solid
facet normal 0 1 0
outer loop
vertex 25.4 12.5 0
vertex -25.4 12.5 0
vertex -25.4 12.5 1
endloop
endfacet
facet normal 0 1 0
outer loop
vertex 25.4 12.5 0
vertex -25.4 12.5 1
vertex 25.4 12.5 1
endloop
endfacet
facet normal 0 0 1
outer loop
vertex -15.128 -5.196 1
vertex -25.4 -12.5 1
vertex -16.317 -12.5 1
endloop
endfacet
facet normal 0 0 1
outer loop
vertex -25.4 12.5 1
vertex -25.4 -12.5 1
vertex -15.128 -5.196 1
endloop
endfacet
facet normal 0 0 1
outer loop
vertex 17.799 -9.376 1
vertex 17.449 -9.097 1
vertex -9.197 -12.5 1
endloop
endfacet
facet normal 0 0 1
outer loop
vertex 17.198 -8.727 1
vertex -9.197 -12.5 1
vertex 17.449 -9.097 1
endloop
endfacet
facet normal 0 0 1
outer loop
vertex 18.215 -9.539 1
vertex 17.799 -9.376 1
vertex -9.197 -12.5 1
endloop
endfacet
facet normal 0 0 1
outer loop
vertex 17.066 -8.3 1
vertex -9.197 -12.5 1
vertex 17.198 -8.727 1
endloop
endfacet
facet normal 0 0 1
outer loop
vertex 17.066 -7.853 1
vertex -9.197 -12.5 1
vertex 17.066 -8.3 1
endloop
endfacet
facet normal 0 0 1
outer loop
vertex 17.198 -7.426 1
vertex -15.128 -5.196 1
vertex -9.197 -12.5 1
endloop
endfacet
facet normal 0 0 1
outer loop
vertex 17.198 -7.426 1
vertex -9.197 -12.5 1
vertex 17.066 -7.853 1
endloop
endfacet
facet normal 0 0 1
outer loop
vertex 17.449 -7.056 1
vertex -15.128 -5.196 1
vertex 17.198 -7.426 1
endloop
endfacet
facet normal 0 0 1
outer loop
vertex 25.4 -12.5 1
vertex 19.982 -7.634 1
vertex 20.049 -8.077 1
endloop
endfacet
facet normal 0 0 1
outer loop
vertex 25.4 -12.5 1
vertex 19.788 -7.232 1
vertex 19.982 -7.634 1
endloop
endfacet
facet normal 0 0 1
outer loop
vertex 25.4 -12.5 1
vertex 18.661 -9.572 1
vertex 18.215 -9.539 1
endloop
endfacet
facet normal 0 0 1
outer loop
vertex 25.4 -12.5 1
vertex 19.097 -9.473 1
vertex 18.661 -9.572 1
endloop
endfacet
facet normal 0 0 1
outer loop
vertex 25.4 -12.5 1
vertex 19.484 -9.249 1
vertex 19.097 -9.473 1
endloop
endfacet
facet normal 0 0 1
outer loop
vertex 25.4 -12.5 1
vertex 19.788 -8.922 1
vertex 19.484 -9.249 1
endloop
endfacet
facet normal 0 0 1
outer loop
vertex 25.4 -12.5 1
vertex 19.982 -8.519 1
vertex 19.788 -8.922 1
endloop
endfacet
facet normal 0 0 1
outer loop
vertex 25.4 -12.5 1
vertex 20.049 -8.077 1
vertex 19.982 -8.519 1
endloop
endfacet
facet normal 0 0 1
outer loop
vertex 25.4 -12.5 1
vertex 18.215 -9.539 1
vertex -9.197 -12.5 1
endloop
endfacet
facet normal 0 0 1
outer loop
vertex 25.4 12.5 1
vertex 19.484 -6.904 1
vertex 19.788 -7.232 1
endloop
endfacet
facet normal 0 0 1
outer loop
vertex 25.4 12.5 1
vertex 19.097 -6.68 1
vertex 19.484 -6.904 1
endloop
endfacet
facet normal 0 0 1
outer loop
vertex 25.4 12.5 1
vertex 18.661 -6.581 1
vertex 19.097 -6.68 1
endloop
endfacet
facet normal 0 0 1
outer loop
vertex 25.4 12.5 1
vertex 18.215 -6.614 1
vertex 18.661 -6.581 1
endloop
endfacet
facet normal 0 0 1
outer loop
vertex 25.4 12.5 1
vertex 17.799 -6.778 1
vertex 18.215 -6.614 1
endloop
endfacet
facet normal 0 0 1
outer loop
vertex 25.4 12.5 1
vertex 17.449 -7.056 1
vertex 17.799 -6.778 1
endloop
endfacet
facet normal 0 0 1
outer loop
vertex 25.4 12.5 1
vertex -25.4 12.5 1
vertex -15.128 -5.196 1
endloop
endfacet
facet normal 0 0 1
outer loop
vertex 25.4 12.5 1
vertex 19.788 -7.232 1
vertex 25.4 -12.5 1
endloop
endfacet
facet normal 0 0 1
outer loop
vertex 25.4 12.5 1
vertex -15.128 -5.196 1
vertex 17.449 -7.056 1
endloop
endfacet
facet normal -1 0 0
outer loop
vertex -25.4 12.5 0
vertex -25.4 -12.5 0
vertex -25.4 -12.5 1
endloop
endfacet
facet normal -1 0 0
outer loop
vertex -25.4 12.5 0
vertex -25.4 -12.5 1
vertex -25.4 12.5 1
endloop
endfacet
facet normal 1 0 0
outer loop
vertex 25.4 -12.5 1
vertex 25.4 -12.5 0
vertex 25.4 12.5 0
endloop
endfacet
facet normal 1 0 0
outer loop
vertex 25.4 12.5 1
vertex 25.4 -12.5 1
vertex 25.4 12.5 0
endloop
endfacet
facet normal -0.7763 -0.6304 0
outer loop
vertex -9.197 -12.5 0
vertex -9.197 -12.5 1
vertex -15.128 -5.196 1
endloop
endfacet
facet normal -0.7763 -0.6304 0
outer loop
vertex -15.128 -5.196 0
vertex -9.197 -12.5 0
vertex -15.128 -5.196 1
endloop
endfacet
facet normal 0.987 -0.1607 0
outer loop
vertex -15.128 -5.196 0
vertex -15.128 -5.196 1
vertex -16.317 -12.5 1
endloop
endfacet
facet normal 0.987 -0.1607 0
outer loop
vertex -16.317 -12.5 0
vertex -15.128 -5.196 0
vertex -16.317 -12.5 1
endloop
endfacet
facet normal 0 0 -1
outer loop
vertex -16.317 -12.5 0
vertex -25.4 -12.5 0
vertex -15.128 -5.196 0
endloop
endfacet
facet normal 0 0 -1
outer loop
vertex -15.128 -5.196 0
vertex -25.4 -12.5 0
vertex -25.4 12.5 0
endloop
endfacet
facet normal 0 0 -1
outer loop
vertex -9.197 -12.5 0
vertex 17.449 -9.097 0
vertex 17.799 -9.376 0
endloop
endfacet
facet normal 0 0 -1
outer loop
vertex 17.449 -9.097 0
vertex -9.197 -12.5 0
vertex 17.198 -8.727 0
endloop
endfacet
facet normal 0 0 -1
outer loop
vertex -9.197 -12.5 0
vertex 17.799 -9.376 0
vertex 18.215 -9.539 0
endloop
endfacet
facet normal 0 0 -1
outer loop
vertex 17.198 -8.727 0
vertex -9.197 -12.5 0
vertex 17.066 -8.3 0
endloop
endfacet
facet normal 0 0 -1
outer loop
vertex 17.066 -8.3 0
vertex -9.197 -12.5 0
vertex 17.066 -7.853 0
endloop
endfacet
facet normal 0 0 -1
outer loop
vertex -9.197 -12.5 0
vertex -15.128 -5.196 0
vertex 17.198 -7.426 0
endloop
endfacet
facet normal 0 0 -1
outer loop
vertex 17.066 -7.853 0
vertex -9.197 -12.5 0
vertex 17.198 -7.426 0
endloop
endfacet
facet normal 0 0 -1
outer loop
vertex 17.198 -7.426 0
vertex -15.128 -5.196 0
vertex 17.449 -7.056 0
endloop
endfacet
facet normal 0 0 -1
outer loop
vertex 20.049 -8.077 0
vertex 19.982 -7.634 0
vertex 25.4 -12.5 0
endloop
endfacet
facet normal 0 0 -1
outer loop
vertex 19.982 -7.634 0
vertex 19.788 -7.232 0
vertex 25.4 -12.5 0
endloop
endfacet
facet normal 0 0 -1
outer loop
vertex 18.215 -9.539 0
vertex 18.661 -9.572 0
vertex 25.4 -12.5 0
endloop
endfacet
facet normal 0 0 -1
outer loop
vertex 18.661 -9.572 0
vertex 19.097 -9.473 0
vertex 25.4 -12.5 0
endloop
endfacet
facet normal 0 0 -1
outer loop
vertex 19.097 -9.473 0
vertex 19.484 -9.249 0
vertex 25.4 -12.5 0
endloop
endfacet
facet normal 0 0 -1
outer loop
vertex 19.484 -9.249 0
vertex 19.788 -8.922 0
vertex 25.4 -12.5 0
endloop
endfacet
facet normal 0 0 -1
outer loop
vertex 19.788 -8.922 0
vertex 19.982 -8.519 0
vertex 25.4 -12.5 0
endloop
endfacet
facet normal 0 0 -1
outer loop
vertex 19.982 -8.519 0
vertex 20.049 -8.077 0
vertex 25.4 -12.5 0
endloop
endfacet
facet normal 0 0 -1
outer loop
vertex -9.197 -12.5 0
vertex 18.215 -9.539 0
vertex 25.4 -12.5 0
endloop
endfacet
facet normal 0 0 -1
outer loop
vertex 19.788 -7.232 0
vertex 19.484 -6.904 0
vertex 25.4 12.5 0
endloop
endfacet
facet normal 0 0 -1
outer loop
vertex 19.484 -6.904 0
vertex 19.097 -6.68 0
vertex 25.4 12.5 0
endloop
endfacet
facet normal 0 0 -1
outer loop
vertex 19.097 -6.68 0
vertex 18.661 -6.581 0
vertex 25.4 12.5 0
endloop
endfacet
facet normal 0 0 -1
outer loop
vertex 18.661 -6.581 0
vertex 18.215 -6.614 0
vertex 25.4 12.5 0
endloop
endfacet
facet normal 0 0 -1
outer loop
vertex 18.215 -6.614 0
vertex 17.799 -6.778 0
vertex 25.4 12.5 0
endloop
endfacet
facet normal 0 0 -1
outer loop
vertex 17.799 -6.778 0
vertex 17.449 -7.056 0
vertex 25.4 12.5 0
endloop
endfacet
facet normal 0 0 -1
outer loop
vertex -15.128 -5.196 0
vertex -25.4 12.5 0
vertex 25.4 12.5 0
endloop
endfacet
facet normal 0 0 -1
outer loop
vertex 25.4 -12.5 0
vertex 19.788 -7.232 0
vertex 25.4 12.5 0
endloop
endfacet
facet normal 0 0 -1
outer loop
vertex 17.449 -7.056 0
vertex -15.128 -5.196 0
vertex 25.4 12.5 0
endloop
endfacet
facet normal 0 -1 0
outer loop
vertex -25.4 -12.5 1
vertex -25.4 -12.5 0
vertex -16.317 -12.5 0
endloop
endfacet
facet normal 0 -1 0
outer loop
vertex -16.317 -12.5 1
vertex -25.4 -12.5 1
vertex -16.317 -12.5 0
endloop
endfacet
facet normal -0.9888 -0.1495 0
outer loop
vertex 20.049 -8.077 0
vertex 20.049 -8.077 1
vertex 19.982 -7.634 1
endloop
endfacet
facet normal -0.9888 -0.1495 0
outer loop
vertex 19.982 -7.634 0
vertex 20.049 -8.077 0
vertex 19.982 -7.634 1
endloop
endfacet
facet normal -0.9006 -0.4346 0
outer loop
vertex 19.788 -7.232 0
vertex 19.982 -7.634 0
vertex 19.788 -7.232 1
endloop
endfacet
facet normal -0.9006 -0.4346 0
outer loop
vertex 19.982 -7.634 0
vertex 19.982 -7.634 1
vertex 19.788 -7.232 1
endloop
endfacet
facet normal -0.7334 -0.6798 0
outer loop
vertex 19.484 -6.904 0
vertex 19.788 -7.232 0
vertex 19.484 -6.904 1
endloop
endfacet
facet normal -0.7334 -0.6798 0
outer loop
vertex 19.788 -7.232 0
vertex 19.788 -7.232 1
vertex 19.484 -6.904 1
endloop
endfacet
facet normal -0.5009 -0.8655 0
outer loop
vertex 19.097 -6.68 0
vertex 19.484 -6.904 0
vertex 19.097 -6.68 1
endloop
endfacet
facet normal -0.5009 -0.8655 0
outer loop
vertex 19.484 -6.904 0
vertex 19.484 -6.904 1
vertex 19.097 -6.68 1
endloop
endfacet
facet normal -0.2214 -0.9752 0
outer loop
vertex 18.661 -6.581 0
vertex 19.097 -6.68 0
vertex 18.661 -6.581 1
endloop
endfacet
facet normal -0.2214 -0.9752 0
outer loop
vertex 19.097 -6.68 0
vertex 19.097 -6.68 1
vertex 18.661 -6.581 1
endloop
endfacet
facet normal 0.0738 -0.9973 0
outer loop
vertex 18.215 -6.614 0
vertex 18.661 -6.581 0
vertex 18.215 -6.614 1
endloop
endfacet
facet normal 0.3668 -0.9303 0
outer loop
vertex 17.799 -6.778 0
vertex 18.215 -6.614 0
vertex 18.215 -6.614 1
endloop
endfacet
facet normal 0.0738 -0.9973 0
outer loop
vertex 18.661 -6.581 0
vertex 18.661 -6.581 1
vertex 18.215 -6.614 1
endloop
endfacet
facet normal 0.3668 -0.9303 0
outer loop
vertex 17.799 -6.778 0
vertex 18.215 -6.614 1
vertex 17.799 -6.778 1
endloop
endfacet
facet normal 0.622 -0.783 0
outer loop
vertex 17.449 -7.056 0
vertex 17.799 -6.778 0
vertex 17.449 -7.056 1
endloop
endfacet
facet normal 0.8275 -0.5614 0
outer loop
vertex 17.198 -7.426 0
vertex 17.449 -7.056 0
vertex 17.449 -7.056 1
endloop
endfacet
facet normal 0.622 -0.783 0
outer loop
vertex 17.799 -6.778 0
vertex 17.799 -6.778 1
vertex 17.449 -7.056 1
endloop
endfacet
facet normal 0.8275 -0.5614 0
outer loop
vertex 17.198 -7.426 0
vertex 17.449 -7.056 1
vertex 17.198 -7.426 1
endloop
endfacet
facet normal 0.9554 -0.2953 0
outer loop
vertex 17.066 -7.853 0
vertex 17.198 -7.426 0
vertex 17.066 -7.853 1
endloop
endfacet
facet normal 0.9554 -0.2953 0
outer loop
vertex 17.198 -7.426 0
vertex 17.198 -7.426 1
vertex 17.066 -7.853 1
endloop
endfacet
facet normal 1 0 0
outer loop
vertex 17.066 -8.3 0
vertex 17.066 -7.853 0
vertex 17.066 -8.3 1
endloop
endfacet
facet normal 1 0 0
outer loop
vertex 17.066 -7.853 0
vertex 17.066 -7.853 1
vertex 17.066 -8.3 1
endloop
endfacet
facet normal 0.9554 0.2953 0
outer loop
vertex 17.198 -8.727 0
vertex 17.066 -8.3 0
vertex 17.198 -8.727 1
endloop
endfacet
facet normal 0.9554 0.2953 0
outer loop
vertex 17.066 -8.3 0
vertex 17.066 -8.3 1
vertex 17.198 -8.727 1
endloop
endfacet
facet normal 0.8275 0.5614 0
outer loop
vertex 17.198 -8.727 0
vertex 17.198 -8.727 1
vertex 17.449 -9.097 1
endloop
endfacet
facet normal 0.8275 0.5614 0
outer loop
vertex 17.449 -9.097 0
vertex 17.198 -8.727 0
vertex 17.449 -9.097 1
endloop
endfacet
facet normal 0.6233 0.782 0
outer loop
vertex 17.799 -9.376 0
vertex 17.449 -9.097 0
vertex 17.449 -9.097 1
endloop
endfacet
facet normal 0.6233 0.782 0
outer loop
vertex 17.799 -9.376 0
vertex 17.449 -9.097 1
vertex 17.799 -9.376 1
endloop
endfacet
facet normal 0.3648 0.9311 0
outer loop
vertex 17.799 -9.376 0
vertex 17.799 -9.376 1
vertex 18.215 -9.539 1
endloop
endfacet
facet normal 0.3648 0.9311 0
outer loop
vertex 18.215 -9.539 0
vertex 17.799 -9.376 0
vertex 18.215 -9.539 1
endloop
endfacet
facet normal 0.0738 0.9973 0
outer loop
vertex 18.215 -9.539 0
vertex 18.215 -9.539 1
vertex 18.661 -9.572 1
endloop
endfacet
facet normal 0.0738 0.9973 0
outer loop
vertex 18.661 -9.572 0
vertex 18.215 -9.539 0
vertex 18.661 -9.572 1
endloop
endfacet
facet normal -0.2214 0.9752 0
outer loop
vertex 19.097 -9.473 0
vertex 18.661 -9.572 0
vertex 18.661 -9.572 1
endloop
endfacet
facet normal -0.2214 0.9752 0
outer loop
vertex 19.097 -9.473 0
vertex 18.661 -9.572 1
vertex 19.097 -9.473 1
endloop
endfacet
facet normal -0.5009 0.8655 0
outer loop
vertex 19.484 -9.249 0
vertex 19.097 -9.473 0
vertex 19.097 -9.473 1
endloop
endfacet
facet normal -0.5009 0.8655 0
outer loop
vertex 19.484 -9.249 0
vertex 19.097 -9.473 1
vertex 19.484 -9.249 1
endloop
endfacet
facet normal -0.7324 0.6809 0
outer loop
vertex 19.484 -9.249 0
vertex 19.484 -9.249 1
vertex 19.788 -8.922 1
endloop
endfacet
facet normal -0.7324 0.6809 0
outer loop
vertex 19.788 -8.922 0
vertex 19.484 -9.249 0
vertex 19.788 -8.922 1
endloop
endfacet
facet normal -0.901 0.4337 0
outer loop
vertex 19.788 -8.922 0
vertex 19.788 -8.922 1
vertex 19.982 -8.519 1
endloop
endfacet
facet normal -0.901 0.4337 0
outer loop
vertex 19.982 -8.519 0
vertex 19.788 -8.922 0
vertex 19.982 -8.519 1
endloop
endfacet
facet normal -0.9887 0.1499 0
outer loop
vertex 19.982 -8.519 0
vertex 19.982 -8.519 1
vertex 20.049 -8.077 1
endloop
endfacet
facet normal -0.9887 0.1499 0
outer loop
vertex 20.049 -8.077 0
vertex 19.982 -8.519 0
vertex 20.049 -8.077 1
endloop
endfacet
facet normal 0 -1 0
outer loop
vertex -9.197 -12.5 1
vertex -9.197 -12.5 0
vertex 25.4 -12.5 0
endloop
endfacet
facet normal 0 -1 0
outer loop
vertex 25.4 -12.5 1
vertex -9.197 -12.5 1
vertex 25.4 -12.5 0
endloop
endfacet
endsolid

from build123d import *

# Parameters (mm, degrees)
F0_W     = 50.8
F0_H     = 25
F1_DEPTH = 1
F2_R     = 1.5
F3_DEPTH = 25
F5_DEPTH = 25


with BuildPart() as f1:
    # F0 (on Top) → F1 (new body)
    with BuildSketch(Plane.XY):
        Rectangle(F0_W, F0_H)
    extrude(amount=F1_DEPTH)

    # F2 (on face) → F3 (cut)
    with BuildSketch(Plane.XY.offset(1)):
        with Locations((18.549042, -8.076559)):
            Circle(F2_R)
    extrude(amount=-F3_DEPTH, mode=Mode.SUBTRACT)

    # F4 (on face) → F5 (cut)
    with BuildSketch(Plane.XY.offset(1)):
        Polygon((-15.12827, -5.19568), (-16.317381, -12.5), (-9.196741, -12.5), align=None)
    extrude(amount=-F5_DEPTH, mode=Mode.SUBTRACT)


solid = f1.part
